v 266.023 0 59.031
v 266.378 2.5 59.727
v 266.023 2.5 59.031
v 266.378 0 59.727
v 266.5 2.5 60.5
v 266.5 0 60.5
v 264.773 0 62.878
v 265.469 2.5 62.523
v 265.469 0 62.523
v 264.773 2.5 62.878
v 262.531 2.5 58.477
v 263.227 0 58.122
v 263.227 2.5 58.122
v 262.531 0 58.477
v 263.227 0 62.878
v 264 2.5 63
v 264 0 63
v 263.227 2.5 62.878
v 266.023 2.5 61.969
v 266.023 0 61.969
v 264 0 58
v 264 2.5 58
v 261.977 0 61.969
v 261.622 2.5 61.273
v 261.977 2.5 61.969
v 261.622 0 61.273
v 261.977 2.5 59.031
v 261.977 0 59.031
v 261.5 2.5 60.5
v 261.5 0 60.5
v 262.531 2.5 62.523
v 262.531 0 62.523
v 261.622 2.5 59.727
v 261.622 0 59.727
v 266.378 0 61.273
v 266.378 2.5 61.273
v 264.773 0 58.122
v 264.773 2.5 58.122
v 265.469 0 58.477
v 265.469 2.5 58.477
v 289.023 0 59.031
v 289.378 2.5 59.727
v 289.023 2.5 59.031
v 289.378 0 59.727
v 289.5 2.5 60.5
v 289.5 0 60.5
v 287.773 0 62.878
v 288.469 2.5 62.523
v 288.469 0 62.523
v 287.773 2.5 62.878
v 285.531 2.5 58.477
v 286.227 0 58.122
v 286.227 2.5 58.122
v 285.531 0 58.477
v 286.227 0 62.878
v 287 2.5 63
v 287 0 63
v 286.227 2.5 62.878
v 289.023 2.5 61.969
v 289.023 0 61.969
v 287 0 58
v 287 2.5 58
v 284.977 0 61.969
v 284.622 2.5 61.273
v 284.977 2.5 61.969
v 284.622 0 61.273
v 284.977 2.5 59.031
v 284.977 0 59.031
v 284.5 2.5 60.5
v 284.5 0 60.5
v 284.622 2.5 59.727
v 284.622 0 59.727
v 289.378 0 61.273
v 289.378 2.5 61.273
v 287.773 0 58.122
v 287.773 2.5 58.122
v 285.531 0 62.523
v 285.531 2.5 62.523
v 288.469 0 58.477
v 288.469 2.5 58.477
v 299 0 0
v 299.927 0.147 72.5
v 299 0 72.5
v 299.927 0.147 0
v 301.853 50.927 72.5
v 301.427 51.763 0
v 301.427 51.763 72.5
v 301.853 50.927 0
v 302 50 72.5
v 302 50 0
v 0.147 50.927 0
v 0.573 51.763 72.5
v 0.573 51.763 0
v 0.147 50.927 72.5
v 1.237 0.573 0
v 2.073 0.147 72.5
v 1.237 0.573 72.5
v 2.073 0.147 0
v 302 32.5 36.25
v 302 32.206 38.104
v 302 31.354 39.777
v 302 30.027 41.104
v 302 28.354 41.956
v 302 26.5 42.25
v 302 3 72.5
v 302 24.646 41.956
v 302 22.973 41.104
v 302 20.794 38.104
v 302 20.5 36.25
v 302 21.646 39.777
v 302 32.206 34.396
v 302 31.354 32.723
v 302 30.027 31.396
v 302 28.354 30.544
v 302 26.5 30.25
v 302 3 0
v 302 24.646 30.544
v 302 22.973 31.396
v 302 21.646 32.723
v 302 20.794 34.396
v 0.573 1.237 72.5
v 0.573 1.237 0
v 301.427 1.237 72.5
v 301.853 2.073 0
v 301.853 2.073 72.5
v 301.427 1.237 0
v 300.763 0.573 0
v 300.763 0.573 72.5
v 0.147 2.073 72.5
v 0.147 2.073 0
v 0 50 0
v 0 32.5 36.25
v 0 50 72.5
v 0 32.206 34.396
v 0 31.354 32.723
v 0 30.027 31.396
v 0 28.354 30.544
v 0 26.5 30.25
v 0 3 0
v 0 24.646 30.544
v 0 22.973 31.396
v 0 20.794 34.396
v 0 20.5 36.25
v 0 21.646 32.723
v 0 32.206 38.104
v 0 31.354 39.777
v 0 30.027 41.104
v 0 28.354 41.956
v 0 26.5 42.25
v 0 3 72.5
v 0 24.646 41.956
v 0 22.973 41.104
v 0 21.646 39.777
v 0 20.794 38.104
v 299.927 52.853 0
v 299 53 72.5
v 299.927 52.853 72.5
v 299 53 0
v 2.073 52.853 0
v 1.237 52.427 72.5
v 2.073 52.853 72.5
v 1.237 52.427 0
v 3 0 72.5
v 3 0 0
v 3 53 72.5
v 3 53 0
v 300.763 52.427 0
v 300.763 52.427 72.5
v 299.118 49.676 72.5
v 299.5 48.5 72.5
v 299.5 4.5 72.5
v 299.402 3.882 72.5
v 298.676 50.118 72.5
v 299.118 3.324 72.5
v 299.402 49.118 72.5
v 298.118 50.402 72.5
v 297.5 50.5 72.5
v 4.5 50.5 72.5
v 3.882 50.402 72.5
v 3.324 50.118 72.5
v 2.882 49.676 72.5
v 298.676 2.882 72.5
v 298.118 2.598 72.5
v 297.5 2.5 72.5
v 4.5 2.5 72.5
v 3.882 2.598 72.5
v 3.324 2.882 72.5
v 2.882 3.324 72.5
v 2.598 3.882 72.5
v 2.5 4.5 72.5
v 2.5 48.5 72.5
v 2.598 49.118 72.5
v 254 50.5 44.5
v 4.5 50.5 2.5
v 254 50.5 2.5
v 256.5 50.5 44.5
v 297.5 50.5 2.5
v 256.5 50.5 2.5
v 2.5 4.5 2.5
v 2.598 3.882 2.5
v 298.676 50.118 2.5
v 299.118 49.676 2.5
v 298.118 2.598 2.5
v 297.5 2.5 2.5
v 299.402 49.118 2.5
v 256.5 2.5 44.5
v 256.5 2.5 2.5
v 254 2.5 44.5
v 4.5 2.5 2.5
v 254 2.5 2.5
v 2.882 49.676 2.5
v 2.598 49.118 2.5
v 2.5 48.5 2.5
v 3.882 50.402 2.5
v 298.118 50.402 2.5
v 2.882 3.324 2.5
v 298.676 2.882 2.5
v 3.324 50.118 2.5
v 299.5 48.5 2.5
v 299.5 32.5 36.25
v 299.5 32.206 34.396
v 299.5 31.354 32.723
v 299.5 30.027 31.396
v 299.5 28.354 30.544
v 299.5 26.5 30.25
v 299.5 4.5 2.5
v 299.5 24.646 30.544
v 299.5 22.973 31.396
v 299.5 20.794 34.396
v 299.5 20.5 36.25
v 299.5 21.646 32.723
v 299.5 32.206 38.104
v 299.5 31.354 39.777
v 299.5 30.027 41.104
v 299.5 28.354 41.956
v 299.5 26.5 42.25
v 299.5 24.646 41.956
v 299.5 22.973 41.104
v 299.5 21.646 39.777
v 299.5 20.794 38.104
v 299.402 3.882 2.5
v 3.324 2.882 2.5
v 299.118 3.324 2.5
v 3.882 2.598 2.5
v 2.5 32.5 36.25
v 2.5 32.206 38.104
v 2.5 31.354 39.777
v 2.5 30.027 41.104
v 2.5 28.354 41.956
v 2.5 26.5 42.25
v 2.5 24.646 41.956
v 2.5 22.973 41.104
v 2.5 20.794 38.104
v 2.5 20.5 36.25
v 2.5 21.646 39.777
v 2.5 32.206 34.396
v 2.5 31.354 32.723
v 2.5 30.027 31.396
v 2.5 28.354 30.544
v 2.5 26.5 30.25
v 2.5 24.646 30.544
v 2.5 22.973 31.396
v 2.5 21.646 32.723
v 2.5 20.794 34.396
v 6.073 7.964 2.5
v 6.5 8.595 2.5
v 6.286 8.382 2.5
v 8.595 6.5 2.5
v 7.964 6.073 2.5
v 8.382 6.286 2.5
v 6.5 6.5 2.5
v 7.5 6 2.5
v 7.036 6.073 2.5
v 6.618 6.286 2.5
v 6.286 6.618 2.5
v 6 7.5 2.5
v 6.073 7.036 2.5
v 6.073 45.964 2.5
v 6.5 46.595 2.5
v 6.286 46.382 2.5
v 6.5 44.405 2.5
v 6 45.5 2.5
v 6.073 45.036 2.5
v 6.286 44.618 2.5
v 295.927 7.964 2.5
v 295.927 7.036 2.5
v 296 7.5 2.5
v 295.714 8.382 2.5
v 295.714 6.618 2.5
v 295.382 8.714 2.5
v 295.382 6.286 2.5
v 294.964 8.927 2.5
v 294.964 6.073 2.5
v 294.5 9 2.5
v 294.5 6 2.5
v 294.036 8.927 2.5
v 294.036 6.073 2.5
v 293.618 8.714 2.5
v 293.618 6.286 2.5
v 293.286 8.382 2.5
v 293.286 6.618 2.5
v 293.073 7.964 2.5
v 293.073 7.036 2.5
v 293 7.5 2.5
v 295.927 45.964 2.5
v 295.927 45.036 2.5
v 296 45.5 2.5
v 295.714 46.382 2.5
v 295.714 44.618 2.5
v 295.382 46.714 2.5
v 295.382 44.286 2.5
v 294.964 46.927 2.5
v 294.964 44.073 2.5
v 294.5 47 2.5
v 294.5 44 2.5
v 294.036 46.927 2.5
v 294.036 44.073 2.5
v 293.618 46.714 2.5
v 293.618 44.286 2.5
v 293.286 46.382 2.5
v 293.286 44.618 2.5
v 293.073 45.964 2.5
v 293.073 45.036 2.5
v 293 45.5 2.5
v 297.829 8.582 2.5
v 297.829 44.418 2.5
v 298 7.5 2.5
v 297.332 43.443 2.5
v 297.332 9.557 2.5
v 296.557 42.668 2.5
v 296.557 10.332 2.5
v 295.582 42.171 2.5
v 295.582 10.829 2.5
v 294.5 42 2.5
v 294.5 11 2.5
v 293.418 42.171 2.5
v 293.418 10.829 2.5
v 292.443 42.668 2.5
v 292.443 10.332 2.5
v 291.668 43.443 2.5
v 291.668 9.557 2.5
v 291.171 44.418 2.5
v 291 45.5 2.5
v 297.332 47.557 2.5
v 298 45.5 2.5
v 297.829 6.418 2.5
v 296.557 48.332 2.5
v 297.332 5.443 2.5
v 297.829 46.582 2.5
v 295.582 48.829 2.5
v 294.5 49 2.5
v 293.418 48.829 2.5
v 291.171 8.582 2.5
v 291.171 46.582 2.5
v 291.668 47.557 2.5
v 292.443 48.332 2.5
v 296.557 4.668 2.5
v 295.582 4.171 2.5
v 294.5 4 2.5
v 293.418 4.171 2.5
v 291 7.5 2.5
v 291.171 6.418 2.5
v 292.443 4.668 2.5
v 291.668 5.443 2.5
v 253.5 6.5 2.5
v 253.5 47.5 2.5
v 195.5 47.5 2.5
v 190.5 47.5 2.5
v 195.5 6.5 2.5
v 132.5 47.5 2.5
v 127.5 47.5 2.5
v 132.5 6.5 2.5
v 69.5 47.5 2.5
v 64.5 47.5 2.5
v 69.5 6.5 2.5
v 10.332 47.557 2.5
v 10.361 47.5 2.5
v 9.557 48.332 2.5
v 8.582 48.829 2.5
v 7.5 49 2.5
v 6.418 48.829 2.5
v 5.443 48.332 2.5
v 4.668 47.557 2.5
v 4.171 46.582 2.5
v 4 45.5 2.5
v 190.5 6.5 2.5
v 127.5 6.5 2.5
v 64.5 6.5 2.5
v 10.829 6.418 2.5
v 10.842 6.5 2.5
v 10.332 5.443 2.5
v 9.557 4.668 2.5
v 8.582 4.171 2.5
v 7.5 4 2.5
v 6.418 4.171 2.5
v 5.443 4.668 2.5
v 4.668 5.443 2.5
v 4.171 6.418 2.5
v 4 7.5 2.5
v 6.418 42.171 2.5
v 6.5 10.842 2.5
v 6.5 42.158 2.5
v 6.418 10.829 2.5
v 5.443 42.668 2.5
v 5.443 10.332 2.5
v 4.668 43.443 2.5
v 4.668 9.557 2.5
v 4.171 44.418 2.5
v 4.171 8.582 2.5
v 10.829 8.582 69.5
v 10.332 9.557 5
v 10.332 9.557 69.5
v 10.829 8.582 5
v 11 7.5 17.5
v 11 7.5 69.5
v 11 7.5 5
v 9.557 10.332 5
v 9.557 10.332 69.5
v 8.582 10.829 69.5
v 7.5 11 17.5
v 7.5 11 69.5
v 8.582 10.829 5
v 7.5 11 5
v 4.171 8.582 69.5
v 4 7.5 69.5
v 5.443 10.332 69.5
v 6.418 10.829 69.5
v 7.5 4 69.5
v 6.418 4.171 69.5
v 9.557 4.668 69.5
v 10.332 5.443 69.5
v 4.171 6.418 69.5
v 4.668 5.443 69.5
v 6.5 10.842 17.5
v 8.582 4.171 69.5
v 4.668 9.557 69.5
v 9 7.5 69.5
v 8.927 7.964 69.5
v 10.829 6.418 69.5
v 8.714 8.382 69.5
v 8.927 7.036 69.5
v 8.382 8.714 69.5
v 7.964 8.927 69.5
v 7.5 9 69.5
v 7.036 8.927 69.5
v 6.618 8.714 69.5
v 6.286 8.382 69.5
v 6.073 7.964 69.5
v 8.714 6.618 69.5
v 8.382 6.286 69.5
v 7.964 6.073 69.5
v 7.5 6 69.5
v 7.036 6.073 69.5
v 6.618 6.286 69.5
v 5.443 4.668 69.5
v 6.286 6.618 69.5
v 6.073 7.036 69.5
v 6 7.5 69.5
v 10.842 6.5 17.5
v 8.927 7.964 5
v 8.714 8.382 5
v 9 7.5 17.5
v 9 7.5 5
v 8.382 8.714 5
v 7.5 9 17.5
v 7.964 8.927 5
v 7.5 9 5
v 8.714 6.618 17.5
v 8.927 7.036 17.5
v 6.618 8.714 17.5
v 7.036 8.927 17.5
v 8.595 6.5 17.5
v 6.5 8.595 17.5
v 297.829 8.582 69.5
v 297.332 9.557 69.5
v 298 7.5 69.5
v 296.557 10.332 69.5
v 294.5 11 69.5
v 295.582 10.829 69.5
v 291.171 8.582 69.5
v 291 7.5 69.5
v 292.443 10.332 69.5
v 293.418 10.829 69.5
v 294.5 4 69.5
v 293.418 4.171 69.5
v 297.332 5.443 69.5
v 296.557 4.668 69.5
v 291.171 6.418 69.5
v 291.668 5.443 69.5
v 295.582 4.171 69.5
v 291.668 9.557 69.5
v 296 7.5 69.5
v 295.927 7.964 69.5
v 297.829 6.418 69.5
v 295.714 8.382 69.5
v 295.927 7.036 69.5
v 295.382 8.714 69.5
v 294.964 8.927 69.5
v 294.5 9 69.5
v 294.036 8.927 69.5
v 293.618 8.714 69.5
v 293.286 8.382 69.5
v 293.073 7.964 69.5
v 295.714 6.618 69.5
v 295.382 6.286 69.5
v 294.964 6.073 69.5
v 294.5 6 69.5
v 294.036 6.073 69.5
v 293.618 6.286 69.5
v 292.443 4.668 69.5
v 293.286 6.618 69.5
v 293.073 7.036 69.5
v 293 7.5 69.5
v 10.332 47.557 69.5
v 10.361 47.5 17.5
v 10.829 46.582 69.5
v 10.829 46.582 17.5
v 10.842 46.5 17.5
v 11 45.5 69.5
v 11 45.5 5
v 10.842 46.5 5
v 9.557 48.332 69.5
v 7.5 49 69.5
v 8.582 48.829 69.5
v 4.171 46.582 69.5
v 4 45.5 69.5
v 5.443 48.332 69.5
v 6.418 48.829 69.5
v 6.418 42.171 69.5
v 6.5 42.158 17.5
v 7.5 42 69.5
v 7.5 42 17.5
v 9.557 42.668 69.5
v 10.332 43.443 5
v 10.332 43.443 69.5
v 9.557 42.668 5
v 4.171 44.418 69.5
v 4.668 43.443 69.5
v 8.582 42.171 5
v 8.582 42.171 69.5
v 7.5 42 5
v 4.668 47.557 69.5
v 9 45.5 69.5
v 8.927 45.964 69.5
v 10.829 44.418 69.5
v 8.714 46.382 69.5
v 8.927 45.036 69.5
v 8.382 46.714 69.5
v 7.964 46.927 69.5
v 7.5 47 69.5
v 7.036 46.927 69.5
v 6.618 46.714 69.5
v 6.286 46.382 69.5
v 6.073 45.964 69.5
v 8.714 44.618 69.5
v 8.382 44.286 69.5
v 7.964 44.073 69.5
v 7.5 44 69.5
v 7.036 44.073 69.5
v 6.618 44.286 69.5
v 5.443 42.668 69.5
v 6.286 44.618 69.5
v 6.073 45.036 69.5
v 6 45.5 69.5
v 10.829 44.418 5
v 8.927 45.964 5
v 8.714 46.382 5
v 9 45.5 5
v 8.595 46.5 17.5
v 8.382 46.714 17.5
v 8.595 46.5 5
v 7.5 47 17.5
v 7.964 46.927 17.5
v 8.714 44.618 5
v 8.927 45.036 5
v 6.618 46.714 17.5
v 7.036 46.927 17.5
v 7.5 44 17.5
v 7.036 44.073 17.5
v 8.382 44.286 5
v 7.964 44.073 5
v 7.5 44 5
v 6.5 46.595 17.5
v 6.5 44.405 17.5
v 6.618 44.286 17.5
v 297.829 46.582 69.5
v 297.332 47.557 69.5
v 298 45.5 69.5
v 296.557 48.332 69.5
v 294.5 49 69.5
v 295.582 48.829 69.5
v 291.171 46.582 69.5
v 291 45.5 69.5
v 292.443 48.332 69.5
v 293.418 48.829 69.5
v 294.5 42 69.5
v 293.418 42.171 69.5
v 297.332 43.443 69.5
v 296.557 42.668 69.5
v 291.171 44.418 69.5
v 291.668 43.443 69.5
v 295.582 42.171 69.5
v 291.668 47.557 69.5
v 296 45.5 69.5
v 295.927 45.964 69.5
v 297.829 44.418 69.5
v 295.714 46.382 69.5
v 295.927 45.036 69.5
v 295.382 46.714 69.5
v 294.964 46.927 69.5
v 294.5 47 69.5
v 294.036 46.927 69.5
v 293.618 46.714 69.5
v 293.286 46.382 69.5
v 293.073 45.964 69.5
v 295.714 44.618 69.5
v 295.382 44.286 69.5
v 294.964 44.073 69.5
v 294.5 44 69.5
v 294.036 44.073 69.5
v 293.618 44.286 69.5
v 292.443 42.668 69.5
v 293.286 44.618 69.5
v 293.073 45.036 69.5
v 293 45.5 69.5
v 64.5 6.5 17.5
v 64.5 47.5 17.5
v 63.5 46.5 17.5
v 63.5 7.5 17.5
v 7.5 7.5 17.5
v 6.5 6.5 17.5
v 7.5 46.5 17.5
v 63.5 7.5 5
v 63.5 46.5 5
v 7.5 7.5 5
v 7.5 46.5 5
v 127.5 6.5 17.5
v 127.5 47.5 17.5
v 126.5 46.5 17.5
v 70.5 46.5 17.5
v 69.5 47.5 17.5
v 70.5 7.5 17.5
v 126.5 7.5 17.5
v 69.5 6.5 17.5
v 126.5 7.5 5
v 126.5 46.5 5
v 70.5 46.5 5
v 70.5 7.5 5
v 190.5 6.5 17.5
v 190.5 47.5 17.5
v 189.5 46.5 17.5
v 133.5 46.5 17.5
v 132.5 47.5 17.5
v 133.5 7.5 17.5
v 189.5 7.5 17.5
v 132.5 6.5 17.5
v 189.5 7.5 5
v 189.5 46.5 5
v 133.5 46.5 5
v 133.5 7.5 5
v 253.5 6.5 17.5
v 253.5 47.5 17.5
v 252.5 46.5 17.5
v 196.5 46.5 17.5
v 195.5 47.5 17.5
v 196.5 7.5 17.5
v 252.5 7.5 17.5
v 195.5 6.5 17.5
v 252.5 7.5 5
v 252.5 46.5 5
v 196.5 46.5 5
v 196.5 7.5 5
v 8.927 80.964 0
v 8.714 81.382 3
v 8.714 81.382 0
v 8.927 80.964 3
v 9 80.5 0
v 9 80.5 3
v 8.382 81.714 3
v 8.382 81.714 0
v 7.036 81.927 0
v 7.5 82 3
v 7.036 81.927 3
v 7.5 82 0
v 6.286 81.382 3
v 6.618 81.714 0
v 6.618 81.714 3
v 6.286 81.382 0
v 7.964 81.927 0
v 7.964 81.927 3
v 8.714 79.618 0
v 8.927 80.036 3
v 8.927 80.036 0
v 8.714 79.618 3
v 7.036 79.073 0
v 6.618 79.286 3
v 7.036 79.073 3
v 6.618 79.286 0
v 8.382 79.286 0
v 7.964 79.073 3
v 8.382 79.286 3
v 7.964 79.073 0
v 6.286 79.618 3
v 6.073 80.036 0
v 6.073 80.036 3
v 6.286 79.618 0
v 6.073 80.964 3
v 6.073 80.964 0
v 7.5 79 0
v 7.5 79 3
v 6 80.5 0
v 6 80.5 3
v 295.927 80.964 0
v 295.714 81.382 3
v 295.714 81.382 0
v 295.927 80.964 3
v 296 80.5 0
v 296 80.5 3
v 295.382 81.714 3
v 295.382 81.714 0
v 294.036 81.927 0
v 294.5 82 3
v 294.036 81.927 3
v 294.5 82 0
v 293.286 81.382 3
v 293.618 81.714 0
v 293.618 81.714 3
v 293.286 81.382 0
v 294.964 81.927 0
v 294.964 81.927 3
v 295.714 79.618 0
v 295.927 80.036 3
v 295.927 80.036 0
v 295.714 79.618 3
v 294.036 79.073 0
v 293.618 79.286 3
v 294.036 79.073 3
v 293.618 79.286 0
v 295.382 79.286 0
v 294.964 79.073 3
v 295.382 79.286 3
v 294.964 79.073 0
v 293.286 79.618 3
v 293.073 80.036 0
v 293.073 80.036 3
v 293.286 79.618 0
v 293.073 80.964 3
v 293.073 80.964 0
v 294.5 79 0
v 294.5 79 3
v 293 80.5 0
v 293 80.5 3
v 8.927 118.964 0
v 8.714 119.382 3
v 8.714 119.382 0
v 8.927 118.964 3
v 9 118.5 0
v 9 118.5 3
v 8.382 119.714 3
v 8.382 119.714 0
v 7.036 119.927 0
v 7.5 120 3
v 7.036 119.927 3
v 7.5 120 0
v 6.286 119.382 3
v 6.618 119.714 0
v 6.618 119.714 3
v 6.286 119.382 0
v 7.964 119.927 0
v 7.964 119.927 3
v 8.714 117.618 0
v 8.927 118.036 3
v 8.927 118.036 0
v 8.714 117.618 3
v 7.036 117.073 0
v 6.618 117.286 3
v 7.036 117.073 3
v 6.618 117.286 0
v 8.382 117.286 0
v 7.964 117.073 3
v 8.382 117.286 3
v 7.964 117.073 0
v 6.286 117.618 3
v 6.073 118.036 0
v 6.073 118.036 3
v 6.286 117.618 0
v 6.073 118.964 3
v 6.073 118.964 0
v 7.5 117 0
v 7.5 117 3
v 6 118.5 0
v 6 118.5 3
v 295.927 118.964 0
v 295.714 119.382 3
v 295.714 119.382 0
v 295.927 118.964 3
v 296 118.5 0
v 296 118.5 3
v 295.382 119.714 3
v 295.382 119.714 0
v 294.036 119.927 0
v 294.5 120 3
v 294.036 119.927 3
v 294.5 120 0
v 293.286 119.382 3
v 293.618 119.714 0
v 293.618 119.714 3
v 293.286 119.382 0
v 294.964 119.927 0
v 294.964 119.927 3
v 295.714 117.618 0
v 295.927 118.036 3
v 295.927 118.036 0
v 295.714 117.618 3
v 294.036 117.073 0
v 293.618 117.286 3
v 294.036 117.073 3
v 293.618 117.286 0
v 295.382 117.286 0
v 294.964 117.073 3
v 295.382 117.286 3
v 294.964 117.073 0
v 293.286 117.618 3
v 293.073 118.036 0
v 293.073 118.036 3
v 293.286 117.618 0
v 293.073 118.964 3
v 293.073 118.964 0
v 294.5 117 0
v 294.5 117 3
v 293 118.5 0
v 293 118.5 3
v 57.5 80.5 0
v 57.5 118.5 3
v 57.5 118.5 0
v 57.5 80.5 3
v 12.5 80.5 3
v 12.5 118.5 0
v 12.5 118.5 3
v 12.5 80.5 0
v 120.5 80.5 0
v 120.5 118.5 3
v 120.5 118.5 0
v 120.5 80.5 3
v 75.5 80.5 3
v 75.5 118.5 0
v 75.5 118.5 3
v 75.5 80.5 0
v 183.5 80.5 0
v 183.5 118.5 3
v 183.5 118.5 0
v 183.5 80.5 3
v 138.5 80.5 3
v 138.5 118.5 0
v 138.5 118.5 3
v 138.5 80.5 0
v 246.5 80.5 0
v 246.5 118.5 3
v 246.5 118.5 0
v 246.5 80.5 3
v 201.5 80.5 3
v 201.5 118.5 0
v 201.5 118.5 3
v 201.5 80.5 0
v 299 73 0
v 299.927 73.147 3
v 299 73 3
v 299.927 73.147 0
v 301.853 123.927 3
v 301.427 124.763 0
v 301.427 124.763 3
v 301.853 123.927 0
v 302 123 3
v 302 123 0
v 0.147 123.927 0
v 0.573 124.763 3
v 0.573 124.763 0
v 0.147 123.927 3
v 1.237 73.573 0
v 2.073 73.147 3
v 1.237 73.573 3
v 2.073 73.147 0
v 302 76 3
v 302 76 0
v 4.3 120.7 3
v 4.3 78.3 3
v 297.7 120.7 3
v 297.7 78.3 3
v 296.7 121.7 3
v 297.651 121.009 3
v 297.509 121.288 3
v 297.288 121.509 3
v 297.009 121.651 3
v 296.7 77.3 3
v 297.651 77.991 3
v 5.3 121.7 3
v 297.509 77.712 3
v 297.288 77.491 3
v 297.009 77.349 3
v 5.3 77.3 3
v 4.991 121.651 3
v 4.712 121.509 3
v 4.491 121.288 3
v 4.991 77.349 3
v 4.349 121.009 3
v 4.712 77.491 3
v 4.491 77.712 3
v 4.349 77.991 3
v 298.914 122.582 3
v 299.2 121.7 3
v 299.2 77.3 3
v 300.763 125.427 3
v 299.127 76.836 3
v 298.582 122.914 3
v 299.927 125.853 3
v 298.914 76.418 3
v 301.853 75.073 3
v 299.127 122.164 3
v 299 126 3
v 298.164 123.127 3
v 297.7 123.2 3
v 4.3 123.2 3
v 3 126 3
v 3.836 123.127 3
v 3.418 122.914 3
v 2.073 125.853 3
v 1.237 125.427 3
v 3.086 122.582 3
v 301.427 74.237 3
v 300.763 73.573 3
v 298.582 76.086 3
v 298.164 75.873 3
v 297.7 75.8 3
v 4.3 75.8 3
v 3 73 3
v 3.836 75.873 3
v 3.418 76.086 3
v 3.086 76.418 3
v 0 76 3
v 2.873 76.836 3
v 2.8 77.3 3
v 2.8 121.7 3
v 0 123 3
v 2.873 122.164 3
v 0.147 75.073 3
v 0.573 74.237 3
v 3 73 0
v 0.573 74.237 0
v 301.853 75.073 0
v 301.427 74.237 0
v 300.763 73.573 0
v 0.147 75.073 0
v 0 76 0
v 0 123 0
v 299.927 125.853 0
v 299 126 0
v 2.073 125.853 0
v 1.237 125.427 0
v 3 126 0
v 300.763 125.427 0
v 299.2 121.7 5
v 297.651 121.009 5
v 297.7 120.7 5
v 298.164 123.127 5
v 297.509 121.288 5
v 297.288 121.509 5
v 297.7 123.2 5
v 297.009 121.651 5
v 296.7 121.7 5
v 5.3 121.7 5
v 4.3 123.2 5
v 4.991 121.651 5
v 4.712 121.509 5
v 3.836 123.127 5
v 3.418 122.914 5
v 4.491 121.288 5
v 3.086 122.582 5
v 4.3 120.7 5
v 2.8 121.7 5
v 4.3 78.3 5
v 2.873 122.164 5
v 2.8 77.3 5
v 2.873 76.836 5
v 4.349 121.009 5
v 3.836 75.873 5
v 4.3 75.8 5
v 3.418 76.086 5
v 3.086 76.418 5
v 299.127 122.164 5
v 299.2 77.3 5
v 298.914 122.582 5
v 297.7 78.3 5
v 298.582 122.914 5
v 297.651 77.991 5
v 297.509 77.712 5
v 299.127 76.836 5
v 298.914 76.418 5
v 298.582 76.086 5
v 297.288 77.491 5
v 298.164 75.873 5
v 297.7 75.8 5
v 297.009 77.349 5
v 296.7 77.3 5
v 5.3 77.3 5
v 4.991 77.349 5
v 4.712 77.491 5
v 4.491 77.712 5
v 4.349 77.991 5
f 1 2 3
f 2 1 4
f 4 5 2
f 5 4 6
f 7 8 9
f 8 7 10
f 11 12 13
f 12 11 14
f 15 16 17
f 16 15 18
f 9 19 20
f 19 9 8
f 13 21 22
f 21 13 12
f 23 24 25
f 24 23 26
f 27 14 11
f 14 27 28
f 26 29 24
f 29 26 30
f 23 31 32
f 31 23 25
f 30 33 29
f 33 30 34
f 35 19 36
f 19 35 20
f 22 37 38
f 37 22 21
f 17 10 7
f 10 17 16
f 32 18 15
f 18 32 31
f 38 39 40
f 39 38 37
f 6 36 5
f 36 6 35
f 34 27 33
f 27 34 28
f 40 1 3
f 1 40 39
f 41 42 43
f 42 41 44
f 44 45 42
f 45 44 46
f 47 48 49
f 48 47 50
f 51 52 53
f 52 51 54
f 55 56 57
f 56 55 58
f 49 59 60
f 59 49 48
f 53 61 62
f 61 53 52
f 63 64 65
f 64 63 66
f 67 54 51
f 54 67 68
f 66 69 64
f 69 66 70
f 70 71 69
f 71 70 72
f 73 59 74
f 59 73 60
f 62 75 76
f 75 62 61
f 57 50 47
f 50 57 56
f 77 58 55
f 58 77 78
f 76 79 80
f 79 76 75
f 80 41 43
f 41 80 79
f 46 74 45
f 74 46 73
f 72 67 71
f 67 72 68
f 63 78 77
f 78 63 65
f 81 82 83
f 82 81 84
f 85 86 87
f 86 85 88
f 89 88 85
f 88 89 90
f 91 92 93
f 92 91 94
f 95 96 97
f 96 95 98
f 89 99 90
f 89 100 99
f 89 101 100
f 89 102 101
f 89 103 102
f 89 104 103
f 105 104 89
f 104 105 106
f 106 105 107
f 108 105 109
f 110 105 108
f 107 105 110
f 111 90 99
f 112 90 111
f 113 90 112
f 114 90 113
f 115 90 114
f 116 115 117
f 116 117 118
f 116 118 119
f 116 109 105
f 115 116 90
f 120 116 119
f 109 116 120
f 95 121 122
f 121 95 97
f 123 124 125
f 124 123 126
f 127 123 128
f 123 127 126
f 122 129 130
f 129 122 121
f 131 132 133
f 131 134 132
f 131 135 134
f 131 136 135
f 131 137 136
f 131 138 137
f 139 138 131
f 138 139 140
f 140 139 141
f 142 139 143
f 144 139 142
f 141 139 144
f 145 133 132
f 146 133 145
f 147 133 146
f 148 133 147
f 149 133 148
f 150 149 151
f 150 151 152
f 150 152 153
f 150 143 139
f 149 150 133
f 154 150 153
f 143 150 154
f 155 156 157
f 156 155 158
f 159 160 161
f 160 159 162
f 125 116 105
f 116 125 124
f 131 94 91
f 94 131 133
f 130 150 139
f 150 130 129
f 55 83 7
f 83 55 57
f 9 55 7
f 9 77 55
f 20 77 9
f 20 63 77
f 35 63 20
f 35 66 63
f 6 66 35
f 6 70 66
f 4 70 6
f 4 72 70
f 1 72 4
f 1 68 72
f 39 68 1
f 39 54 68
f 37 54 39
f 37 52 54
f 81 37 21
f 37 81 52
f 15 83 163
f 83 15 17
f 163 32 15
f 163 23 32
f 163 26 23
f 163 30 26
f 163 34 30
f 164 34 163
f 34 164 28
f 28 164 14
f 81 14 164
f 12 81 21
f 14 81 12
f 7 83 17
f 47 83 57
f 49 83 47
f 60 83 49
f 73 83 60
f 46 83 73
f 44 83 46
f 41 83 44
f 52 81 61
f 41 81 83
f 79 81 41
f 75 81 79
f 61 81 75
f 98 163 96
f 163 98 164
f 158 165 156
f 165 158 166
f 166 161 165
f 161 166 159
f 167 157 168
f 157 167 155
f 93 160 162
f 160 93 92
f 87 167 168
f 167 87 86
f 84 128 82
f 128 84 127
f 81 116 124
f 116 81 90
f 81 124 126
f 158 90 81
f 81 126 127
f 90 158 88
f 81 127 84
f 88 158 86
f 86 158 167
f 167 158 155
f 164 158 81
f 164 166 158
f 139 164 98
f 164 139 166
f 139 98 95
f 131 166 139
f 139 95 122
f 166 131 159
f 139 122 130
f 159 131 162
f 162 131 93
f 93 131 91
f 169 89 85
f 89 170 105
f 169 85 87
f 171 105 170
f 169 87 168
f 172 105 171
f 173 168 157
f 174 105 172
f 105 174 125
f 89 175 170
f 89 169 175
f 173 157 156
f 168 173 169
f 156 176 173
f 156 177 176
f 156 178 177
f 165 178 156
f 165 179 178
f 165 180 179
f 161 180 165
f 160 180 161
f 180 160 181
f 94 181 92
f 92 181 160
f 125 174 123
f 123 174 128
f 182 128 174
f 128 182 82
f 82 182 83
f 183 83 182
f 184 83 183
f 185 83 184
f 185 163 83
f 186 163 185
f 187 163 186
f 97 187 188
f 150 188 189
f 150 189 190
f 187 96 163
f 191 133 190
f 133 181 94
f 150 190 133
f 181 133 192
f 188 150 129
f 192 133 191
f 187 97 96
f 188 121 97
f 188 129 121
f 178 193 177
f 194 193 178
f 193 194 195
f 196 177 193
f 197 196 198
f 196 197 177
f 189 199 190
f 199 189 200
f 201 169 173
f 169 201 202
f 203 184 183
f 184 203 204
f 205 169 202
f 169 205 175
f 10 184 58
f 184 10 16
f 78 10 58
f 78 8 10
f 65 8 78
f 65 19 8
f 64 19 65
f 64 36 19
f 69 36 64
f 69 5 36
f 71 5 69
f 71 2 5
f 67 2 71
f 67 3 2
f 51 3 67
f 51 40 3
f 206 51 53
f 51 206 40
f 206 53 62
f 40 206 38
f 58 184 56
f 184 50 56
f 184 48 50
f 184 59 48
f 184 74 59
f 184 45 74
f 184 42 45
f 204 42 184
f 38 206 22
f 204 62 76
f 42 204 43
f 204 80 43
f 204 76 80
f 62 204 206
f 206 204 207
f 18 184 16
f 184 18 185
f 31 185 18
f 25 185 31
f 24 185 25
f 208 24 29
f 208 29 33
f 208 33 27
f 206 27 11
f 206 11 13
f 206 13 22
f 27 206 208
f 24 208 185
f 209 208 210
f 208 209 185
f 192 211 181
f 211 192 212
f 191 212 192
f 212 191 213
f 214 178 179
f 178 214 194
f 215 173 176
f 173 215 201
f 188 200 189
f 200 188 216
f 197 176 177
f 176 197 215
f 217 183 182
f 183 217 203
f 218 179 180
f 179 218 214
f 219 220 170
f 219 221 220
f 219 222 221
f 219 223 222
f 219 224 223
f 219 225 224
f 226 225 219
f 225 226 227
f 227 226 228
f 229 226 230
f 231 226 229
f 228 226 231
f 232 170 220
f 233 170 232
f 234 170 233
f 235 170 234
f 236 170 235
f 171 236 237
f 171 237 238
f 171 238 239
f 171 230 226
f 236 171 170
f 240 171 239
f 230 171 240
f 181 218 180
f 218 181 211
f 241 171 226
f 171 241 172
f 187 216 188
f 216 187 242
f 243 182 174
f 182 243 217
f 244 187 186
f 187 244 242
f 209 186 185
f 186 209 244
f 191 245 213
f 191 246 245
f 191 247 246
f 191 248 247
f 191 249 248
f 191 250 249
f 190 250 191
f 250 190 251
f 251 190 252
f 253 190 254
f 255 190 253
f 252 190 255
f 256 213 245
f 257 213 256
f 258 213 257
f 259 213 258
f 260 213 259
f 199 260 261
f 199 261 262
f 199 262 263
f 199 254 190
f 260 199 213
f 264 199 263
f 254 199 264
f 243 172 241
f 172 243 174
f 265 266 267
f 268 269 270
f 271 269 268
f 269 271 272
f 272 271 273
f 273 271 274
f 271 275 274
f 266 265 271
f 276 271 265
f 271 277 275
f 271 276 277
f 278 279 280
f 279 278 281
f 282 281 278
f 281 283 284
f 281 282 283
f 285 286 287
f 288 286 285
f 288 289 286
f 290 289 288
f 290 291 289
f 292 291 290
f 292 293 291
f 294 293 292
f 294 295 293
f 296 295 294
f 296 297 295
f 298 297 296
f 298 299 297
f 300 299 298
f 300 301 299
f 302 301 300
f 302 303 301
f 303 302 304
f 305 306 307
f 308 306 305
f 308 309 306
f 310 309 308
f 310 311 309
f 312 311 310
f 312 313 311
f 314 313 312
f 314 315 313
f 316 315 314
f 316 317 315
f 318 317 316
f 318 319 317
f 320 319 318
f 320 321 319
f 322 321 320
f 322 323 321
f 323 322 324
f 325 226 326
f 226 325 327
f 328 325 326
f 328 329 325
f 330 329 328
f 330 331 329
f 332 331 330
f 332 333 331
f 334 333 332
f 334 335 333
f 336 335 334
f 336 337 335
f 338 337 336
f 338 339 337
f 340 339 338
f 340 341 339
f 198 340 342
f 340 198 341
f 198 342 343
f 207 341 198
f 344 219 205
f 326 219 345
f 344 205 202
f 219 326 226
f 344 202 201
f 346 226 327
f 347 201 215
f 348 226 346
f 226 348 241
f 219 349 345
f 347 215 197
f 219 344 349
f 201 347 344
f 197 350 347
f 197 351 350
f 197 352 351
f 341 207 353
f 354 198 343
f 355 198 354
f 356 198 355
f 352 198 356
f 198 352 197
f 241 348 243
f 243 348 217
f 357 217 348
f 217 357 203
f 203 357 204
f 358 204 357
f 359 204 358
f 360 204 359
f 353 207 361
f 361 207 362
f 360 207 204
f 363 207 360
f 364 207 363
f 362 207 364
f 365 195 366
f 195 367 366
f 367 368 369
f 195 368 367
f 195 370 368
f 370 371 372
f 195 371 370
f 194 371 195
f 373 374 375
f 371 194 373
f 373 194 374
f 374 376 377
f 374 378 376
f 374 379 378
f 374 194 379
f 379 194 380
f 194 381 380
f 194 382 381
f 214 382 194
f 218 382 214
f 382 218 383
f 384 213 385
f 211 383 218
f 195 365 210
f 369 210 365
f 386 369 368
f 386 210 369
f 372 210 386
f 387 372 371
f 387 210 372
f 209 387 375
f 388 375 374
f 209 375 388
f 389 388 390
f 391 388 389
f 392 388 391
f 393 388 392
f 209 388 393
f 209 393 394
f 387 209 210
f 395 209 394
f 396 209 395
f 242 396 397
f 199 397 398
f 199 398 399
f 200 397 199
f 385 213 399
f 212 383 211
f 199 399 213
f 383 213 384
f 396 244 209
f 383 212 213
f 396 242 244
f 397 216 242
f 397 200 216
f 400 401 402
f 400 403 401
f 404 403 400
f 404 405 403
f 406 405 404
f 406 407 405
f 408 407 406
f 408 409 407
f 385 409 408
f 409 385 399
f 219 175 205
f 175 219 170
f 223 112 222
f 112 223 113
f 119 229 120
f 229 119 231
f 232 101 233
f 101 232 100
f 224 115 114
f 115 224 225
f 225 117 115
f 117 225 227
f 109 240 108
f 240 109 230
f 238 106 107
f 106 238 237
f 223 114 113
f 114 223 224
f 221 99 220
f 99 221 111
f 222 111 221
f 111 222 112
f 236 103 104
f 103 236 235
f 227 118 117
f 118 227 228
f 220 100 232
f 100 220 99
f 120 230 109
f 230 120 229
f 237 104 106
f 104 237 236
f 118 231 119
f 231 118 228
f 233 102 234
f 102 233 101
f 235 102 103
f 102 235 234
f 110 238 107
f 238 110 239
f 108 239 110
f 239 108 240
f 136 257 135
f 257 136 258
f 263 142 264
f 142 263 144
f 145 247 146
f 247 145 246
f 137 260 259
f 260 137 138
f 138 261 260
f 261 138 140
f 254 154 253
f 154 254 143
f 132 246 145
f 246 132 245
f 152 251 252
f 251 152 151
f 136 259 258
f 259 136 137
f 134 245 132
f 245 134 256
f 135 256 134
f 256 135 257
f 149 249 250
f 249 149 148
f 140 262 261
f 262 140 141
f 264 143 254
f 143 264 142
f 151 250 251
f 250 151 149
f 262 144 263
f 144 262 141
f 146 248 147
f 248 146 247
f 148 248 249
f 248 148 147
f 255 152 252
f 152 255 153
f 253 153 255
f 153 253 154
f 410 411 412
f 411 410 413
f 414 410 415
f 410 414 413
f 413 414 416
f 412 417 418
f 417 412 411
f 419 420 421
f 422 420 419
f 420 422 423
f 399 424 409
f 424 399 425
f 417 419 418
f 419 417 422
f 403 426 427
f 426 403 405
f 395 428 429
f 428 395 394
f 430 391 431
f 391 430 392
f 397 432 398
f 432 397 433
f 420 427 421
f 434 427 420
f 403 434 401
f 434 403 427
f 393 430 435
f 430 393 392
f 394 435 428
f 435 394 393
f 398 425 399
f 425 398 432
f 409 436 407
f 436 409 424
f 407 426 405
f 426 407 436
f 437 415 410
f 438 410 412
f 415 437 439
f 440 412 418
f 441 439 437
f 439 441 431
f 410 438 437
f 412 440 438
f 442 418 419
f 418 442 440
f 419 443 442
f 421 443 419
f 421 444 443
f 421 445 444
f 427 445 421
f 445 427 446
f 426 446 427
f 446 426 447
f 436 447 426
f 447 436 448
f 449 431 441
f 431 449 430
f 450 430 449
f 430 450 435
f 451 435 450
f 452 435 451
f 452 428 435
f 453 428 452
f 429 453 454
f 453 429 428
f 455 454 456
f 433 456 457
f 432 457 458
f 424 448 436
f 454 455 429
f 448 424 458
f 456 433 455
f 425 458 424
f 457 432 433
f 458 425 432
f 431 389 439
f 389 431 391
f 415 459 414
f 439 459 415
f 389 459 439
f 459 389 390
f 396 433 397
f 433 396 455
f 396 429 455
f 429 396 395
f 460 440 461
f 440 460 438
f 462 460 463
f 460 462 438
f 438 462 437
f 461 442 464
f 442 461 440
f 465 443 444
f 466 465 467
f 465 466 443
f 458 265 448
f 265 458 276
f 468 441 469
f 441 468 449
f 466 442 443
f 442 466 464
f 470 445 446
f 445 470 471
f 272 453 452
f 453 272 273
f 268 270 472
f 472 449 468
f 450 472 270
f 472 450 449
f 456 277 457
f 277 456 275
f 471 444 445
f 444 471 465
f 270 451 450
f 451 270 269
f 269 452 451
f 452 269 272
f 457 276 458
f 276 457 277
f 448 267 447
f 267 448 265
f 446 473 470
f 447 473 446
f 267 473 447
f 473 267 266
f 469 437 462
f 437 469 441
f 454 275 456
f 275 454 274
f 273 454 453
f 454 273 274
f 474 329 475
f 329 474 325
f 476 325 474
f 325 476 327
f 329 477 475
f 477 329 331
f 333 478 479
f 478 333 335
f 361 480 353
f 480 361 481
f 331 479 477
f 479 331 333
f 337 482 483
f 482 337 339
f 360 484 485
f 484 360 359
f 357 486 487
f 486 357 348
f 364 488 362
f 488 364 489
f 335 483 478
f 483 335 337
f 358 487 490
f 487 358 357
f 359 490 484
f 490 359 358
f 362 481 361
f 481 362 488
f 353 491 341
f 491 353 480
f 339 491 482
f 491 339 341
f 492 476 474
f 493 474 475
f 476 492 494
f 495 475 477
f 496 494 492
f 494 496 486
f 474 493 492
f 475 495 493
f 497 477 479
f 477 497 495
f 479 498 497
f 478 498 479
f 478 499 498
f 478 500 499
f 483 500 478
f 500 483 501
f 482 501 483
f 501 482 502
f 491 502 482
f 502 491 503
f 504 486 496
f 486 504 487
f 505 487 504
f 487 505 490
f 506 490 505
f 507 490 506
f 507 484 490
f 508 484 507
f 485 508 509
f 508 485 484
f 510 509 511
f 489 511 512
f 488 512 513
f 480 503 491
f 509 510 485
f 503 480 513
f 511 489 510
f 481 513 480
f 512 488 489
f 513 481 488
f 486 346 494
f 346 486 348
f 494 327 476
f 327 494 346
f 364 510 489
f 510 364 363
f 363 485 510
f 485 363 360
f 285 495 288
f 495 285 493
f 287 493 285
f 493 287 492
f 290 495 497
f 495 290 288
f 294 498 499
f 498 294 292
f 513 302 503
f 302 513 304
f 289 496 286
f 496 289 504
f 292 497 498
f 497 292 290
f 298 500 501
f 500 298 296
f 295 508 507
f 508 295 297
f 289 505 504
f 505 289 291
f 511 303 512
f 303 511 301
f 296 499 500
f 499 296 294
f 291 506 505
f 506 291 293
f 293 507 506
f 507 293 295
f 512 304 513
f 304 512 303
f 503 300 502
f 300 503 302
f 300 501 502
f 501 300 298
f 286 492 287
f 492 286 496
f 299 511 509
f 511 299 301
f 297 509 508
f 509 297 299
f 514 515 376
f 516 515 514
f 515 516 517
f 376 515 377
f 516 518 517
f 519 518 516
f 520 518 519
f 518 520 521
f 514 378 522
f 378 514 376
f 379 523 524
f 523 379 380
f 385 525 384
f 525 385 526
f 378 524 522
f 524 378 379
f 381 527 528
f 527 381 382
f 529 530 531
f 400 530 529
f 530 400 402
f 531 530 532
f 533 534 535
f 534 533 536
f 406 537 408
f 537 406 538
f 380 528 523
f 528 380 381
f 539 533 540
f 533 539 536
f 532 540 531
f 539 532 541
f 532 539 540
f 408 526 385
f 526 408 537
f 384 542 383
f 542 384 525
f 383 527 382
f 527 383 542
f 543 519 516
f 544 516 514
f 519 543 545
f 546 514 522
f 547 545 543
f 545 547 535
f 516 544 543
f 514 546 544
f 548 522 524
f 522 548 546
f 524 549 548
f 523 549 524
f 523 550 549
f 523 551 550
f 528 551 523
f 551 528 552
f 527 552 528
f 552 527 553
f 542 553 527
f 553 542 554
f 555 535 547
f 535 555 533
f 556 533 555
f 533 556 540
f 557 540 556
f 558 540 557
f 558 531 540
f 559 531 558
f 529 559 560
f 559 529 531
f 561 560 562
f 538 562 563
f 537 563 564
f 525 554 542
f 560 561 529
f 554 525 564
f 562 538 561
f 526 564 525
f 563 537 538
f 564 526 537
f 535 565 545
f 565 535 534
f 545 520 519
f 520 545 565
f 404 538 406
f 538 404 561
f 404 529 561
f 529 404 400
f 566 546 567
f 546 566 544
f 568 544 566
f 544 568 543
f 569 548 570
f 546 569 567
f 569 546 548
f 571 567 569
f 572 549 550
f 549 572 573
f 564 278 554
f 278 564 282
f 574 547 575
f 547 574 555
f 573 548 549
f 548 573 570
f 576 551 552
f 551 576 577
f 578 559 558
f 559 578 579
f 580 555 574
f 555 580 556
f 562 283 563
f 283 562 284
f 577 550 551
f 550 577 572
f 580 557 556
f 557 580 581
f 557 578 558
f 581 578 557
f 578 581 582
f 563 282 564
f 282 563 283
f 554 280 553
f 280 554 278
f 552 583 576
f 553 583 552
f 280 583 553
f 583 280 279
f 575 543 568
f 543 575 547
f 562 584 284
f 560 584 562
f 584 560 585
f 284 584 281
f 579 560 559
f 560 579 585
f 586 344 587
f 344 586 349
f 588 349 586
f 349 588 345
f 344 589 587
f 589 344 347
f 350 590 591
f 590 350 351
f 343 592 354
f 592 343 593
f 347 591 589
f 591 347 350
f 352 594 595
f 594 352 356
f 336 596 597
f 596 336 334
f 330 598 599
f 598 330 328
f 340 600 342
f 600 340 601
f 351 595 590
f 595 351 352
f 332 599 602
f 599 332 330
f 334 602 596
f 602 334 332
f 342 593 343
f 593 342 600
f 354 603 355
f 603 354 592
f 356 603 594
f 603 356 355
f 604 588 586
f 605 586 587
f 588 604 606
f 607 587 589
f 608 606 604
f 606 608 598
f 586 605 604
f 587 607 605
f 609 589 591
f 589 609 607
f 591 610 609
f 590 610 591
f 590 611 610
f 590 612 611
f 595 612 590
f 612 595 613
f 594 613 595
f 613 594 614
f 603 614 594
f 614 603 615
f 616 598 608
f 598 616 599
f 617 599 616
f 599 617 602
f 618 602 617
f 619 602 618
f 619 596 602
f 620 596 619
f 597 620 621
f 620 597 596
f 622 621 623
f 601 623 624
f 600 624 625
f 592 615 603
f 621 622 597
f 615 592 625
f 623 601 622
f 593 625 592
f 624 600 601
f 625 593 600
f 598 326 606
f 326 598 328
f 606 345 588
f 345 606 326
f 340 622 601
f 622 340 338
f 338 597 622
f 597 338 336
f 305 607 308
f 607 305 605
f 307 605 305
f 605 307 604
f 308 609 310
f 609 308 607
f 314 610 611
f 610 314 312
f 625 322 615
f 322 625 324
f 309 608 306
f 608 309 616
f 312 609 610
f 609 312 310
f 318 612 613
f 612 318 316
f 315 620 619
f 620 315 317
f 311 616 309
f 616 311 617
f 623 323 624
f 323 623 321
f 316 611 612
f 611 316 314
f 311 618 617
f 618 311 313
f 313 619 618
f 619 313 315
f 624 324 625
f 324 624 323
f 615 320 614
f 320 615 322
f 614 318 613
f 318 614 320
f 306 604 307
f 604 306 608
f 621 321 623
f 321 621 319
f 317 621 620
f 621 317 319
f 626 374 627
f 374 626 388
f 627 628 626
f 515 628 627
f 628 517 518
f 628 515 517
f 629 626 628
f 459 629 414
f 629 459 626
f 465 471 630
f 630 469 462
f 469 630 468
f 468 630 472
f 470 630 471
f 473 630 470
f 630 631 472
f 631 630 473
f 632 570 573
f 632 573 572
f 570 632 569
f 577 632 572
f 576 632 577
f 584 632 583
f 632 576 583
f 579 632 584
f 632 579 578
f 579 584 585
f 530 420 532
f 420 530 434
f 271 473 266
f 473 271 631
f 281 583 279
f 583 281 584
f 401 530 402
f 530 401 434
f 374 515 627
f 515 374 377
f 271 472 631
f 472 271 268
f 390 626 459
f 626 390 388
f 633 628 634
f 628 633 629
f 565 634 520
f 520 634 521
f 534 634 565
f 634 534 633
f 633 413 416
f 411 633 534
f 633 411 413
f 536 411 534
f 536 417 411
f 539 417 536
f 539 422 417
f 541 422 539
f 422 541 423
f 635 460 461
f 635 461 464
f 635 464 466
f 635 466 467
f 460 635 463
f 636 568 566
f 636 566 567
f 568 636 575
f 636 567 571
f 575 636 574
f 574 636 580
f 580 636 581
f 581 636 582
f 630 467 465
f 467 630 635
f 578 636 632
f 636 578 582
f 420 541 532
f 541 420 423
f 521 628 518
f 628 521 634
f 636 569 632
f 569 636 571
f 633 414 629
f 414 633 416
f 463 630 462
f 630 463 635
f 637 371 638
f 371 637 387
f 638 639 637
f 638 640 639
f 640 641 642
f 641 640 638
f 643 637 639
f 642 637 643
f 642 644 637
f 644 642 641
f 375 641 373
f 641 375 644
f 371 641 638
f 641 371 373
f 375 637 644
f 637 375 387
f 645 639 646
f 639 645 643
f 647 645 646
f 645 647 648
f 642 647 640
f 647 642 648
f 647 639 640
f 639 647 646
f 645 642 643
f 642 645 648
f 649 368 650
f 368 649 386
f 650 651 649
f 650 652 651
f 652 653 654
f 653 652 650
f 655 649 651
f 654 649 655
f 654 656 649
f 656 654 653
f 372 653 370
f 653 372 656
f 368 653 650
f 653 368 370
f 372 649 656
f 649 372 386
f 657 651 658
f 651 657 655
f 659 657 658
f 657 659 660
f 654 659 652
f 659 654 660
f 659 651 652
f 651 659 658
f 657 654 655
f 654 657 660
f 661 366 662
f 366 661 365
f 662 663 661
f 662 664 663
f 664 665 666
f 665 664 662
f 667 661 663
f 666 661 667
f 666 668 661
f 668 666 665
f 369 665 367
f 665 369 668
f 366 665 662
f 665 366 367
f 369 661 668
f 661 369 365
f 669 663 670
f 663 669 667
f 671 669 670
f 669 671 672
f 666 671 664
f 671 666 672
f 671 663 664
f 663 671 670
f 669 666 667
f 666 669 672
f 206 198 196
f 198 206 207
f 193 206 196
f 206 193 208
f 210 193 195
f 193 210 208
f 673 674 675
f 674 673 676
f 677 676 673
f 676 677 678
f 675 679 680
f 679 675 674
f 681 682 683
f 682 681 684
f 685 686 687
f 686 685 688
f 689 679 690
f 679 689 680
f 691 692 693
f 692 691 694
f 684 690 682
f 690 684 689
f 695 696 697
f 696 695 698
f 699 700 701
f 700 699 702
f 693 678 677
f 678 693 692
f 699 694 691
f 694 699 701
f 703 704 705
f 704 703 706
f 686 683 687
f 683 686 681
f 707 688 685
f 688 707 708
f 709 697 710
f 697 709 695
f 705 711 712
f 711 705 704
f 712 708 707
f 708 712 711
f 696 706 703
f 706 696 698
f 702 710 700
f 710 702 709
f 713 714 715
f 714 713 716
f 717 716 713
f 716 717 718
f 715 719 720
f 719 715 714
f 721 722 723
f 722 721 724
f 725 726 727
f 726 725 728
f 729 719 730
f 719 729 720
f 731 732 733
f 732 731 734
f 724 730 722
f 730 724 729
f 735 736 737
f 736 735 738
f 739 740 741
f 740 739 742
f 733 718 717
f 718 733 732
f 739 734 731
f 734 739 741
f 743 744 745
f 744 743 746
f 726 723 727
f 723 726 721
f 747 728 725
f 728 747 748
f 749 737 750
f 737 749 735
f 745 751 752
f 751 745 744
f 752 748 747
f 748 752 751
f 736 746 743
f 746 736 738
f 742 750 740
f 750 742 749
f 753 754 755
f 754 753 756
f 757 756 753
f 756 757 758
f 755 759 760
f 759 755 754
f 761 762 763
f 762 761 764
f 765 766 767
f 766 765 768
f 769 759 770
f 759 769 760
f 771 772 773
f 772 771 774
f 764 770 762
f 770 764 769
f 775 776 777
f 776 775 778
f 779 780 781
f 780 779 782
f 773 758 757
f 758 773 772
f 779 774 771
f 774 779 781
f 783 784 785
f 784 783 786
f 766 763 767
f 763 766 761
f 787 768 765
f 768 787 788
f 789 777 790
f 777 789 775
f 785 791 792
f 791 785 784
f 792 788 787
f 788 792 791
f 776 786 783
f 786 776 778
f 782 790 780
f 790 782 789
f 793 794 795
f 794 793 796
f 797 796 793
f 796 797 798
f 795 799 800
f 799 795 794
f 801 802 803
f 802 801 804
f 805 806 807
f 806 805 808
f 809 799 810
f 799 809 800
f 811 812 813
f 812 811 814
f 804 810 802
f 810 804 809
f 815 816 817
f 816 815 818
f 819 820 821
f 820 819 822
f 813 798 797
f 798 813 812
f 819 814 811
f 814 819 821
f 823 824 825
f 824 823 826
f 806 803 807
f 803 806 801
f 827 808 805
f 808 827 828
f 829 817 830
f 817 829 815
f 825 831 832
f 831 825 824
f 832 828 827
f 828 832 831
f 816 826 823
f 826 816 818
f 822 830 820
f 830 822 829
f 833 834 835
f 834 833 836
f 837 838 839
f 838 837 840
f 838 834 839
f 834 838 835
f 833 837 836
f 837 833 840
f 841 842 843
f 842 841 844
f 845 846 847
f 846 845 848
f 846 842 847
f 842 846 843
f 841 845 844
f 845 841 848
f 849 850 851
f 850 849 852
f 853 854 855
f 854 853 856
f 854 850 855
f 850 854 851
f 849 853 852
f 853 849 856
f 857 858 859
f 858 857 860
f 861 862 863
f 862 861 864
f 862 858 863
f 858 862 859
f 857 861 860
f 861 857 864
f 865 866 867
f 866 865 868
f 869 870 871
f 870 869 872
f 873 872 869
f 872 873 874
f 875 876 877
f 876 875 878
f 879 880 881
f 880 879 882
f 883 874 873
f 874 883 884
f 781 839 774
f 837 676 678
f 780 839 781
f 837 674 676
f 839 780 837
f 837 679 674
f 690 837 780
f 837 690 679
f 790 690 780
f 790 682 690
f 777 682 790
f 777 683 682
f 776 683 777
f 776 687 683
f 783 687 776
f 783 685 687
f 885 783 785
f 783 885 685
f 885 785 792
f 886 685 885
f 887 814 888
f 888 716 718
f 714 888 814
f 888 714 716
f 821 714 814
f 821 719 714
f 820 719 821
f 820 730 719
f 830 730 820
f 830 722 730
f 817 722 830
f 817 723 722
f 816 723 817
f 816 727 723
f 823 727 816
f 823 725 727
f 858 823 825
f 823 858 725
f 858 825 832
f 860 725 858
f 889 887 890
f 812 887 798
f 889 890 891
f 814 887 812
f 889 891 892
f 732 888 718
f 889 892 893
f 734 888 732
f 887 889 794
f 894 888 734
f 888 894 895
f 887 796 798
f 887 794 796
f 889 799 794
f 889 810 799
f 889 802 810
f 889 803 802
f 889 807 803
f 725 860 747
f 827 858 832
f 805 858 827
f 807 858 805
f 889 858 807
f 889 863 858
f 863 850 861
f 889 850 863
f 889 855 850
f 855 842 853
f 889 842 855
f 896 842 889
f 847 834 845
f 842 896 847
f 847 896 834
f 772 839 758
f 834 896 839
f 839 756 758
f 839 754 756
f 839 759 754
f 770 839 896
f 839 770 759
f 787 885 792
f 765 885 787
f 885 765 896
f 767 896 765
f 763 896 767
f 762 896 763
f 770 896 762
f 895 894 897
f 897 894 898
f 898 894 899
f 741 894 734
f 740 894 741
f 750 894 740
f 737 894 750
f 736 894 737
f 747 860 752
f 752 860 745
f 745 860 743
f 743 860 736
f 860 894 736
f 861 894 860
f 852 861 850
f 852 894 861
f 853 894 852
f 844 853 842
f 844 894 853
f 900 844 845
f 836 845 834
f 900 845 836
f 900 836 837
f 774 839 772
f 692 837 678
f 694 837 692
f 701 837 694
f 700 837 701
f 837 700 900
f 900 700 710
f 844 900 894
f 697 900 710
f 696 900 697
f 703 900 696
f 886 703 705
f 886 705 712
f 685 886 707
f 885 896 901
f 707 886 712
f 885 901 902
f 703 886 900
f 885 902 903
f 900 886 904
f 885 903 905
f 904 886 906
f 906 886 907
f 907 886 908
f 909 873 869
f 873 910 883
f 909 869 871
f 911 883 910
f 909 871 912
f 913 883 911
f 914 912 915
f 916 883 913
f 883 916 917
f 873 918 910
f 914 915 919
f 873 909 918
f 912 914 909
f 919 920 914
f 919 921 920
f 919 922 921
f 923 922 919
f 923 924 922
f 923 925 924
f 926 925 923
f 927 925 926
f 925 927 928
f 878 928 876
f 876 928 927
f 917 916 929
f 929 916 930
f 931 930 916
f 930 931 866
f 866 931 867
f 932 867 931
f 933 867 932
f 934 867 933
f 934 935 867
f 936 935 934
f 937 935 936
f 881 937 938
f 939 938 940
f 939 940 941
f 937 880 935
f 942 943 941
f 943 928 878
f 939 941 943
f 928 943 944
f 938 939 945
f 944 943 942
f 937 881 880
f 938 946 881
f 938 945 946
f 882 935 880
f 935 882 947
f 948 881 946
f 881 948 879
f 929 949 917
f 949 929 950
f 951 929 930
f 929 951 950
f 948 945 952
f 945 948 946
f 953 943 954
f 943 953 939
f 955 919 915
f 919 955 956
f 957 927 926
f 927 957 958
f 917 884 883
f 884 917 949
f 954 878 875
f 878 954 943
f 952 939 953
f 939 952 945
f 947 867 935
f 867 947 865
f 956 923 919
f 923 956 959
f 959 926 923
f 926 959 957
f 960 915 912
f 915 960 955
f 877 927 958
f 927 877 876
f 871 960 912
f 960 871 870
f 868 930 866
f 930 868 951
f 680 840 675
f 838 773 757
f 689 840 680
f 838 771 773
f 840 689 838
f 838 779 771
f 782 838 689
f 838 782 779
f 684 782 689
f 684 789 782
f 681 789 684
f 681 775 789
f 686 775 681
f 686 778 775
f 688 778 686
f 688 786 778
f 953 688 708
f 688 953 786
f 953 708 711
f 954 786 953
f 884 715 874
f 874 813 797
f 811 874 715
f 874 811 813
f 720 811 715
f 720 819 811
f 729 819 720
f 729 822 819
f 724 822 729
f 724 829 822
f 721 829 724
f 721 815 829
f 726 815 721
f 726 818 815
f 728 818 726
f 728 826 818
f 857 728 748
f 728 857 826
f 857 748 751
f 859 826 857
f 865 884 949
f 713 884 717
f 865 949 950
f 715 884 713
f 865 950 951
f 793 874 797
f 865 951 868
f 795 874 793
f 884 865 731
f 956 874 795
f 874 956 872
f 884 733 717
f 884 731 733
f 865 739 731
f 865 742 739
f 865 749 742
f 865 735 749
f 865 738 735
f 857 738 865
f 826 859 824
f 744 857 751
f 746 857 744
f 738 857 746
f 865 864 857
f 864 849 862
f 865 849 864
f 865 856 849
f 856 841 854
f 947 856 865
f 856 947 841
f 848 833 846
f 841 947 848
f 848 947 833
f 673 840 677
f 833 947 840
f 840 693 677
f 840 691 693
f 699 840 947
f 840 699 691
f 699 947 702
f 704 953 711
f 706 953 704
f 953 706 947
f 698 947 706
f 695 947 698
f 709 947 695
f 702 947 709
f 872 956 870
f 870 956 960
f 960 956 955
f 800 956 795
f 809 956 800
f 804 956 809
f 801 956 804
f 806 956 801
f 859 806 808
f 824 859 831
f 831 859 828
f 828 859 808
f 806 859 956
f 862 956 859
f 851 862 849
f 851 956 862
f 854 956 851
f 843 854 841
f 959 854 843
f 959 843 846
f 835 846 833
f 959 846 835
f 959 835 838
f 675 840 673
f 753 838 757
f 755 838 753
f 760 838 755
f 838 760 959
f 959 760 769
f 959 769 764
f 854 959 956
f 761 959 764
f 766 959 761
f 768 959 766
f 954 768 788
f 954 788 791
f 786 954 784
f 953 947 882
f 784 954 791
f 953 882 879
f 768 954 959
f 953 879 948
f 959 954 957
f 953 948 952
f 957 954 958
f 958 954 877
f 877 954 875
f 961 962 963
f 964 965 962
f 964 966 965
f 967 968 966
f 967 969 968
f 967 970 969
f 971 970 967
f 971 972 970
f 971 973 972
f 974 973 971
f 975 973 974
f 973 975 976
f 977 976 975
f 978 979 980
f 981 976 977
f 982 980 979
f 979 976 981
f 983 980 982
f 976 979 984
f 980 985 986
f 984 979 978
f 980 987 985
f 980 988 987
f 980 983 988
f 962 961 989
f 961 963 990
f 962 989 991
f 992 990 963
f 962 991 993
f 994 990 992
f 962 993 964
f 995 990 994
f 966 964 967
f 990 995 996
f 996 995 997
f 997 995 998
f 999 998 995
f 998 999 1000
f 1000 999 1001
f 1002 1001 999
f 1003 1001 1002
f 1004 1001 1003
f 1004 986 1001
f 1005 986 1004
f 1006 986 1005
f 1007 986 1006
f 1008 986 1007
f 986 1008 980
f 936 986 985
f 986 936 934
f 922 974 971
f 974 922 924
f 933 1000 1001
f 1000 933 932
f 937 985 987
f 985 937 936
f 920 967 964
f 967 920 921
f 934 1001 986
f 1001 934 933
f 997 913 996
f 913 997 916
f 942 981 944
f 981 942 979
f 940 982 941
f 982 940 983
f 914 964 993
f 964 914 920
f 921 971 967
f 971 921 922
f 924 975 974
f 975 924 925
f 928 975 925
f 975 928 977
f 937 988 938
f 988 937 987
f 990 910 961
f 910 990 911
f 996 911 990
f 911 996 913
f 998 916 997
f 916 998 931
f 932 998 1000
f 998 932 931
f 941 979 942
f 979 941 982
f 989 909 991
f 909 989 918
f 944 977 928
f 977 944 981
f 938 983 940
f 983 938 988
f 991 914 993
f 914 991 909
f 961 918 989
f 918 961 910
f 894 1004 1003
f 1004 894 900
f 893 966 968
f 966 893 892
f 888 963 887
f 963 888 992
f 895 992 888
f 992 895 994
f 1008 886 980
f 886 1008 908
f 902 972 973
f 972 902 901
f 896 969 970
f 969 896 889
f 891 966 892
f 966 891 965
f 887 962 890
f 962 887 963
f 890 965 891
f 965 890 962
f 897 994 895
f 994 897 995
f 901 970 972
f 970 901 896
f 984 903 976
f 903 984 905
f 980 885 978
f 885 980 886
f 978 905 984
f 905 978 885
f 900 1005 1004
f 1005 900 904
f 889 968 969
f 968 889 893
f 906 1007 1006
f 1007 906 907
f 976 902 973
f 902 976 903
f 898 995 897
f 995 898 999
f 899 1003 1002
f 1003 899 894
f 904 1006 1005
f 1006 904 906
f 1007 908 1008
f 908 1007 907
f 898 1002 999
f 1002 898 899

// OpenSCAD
// AquaWiz 펌프 + 에어 분배기 하우징
// 내부 부품: 연동 펌프 NKP-DC-B06B x4, 3-way 솔레노이드 밸브 x2

// ==================== 파라미터 ====================

wall = 2.5;
lid_h = 3;

// NKP-DC-B06B 연동 펌프 (약 55 x 38 x 65mm, 모터 포함)
pump_w = 55;   // 폭 (좌우)
pump_d = 38;   // 깊이 (앞뒤)
pump_h = 65;   // 높이 (모터 축 방향)
pump_gap = 8;  // 펌프 사이 간격
pump_n = 4;

// 펌프 마운트 홀 (M3 나사)
pump_mount_d = 3.2;
pump_mount_dist = 30;  // 마운트 홀 간격 (추정)

// 3-way 솔레노이드 밸브 (약 15 x 10 x 20mm)
sol_w = 15;
sol_d = 10;
sol_h = 20;
sol_gap = 8;
sol_n = 2;

margin = 5;

// 레이아웃: 펌프 4개 일렬 + 솔레노이드 2개 옆에
pump_area_w = pump_n * pump_w + (pump_n - 1) * pump_gap;  // 244
sol_area_w = sol_n * sol_w + (sol_n - 1) * sol_gap;  // 74

inner_w = pump_area_w + sol_area_w + margin * 3;  // 333
inner_d = max(pump_d, sol_d) + 2*margin;  // 48
inner_h = max(pump_h, sol_h) + margin;  // 70

outer_w = inner_w + 2*wall;
outer_d = inner_d + 2*wall;
outer_h = inner_h + wall;

// 호스 홀 직경
hose_d = 6;  // 실리콘 호스 외경
air_hose_d = 5;  // 에어 호스

screw_d = 3;
post_d = 7;

// ==================== 모듈 ====================

module rounded_box(w, d, h, r=3) {
    hull() {
        for (x = [r, w-r], y = [r, d-r])
            translate([x, y, 0]) cylinder(h=h, r=r, $fn=20);
    }
}

module screw_post(h) {
    difference() {
        cylinder(d=post_d, h=h, $fn=20);
        translate([0, 0, -0.1])
            cylinder(d=screw_d, h=h+0.2, $fn=20);
    }
}

module pump_mount() {
    // 펌프 안착 가이드 (U자형)
    guide_h = 15;
    guide_w = pump_w + 1;  // 여유
    guide_d = pump_d + 1;

    difference() {
        // 외벽
        translate([-1, -1, 0])
            cube([guide_w + 2, guide_d + 2, guide_h]);
        // 내부
        translate([0, 0, wall])
            cube([guide_w, guide_d, guide_h]);
    }
}

module hose_hole() {
    rotate([90, 0, 0])
        cylinder(d=hose_d, h=wall+2, $fn=20);
}

// ==================== 본체 ====================

module pump_air_base() {
    difference() {
        rounded_box(outer_w, outer_d, outer_h);

        // 내부 공간
        translate([wall, wall, wall])
            rounded_box(inner_w, inner_d, inner_h + 1, r=2);

        // 상단 호스 홀 - 펌프 입출구 (각 펌프당 2개 = 8개)
        for (i = [0:pump_n-1]) {
            px = wall + margin + i*(pump_w + pump_gap) + pump_w/2;
            // 입구 호스
            translate([px - 10, outer_d - wall - 0.5, outer_h - 15])
                hose_hole();
            // 출구 호스
            translate([px + 10, outer_d - wall - 0.5, outer_h - 15])
                hose_hole();
        }

        // 솔레노이드 에어 홀 (입력 1 + 출력 2 x 2개)
        sol_start = wall + margin*2 + pump_area_w;
        for (i = [0:sol_n-1]) {
            sx = sol_start + i*(sol_w + sol_gap) + sol_w/2;
            // 에어 입력
            translate([sx, outer_d - wall - 0.5, outer_h - 12])
                rotate([90, 0, 0])
                    cylinder(d=air_hose_d, h=wall+2, $fn=20);
            // 에어 출력
            translate([sx, -0.5, outer_h - 12])
                rotate([-90, 0, 0])
                    cylinder(d=air_hose_d, h=wall+2, $fn=20);
        }

        // 전선 홀 (우측, 전원 + 신호)
        translate([outer_w - wall - 0.5, outer_d/2, outer_h/2])
            rotate([0, 90, 0])
                cylinder(d=12, h=wall+1, $fn=20);

        // 전선 홀 (좌측)
        translate([-0.5, outer_d/2, outer_h/2])
            rotate([0, 90, 0])
                cylinder(d=12, h=wall+1, $fn=20);
    }

    // 나사 기둥
    ci = wall + 5;
    for (pos = [[ci, ci], [outer_w-ci, ci],
                [ci, outer_d-ci], [outer_w-ci, outer_d-ci]])
        translate([pos[0], pos[1], wall])
            screw_post(inner_h - lid_h);

    // 펌프 안착 가이드
    for (i = [0:pump_n-1]) {
        px = wall + margin + i*(pump_w + pump_gap);
        py = wall + margin;
        translate([px, py, wall])
            pump_mount();
    }

    // 솔레노이드 구분벽
    translate([wall + margin*2 + pump_area_w - wall, wall, wall])
        cube([wall, inner_d, inner_h * 0.6]);
}

// ==================== 뚜껑 ====================

module pump_air_lid() {
    difference() {
        rounded_box(outer_w, outer_d, lid_h);

        // 나사 홀
        ci = wall + 5;
        for (pos = [[ci, ci], [outer_w-ci, ci],
                    [ci, outer_d-ci], [outer_w-ci, outer_d-ci]])
            translate([pos[0], pos[1], -0.1])
                cylinder(d=screw_d, h=lid_h+0.2, $fn=20);

        // 펌프 헤드 접근용 개구부 (호스 연결)
        for (i = [0:pump_n-1]) {
            px = wall + margin + i*(pump_w + pump_gap) + pump_w/2;
            translate([px - pump_w/2 + 5, wall + 5, -0.1])
                cube([pump_w - 10, inner_d - 10, lid_h + 0.2]);
        }
    }

    // 끼움 테두리
    translate([wall + 0.3, wall + 0.3, lid_h])
        difference() {
            rounded_box(inner_w - 0.6, inner_d - 0.6, 2, r=1.5);
            translate([1.5, 1.5, -0.1])
                rounded_box(inner_w - 3.6, inner_d - 3.6, 2.2, r=1);
        }
}

// ==================== 렌더링 ====================

pump_air_base();

translate([0, outer_d + 20, 0])
    pump_air_lid();

echo(str("펌프+분배기 외부 치수: ", outer_w, " x ", outer_d, " x ", outer_h + lid_h, " mm"));
echo(str("내부 치수: ", inner_w, " x ", inner_d, " x ", inner_h, " mm"));
